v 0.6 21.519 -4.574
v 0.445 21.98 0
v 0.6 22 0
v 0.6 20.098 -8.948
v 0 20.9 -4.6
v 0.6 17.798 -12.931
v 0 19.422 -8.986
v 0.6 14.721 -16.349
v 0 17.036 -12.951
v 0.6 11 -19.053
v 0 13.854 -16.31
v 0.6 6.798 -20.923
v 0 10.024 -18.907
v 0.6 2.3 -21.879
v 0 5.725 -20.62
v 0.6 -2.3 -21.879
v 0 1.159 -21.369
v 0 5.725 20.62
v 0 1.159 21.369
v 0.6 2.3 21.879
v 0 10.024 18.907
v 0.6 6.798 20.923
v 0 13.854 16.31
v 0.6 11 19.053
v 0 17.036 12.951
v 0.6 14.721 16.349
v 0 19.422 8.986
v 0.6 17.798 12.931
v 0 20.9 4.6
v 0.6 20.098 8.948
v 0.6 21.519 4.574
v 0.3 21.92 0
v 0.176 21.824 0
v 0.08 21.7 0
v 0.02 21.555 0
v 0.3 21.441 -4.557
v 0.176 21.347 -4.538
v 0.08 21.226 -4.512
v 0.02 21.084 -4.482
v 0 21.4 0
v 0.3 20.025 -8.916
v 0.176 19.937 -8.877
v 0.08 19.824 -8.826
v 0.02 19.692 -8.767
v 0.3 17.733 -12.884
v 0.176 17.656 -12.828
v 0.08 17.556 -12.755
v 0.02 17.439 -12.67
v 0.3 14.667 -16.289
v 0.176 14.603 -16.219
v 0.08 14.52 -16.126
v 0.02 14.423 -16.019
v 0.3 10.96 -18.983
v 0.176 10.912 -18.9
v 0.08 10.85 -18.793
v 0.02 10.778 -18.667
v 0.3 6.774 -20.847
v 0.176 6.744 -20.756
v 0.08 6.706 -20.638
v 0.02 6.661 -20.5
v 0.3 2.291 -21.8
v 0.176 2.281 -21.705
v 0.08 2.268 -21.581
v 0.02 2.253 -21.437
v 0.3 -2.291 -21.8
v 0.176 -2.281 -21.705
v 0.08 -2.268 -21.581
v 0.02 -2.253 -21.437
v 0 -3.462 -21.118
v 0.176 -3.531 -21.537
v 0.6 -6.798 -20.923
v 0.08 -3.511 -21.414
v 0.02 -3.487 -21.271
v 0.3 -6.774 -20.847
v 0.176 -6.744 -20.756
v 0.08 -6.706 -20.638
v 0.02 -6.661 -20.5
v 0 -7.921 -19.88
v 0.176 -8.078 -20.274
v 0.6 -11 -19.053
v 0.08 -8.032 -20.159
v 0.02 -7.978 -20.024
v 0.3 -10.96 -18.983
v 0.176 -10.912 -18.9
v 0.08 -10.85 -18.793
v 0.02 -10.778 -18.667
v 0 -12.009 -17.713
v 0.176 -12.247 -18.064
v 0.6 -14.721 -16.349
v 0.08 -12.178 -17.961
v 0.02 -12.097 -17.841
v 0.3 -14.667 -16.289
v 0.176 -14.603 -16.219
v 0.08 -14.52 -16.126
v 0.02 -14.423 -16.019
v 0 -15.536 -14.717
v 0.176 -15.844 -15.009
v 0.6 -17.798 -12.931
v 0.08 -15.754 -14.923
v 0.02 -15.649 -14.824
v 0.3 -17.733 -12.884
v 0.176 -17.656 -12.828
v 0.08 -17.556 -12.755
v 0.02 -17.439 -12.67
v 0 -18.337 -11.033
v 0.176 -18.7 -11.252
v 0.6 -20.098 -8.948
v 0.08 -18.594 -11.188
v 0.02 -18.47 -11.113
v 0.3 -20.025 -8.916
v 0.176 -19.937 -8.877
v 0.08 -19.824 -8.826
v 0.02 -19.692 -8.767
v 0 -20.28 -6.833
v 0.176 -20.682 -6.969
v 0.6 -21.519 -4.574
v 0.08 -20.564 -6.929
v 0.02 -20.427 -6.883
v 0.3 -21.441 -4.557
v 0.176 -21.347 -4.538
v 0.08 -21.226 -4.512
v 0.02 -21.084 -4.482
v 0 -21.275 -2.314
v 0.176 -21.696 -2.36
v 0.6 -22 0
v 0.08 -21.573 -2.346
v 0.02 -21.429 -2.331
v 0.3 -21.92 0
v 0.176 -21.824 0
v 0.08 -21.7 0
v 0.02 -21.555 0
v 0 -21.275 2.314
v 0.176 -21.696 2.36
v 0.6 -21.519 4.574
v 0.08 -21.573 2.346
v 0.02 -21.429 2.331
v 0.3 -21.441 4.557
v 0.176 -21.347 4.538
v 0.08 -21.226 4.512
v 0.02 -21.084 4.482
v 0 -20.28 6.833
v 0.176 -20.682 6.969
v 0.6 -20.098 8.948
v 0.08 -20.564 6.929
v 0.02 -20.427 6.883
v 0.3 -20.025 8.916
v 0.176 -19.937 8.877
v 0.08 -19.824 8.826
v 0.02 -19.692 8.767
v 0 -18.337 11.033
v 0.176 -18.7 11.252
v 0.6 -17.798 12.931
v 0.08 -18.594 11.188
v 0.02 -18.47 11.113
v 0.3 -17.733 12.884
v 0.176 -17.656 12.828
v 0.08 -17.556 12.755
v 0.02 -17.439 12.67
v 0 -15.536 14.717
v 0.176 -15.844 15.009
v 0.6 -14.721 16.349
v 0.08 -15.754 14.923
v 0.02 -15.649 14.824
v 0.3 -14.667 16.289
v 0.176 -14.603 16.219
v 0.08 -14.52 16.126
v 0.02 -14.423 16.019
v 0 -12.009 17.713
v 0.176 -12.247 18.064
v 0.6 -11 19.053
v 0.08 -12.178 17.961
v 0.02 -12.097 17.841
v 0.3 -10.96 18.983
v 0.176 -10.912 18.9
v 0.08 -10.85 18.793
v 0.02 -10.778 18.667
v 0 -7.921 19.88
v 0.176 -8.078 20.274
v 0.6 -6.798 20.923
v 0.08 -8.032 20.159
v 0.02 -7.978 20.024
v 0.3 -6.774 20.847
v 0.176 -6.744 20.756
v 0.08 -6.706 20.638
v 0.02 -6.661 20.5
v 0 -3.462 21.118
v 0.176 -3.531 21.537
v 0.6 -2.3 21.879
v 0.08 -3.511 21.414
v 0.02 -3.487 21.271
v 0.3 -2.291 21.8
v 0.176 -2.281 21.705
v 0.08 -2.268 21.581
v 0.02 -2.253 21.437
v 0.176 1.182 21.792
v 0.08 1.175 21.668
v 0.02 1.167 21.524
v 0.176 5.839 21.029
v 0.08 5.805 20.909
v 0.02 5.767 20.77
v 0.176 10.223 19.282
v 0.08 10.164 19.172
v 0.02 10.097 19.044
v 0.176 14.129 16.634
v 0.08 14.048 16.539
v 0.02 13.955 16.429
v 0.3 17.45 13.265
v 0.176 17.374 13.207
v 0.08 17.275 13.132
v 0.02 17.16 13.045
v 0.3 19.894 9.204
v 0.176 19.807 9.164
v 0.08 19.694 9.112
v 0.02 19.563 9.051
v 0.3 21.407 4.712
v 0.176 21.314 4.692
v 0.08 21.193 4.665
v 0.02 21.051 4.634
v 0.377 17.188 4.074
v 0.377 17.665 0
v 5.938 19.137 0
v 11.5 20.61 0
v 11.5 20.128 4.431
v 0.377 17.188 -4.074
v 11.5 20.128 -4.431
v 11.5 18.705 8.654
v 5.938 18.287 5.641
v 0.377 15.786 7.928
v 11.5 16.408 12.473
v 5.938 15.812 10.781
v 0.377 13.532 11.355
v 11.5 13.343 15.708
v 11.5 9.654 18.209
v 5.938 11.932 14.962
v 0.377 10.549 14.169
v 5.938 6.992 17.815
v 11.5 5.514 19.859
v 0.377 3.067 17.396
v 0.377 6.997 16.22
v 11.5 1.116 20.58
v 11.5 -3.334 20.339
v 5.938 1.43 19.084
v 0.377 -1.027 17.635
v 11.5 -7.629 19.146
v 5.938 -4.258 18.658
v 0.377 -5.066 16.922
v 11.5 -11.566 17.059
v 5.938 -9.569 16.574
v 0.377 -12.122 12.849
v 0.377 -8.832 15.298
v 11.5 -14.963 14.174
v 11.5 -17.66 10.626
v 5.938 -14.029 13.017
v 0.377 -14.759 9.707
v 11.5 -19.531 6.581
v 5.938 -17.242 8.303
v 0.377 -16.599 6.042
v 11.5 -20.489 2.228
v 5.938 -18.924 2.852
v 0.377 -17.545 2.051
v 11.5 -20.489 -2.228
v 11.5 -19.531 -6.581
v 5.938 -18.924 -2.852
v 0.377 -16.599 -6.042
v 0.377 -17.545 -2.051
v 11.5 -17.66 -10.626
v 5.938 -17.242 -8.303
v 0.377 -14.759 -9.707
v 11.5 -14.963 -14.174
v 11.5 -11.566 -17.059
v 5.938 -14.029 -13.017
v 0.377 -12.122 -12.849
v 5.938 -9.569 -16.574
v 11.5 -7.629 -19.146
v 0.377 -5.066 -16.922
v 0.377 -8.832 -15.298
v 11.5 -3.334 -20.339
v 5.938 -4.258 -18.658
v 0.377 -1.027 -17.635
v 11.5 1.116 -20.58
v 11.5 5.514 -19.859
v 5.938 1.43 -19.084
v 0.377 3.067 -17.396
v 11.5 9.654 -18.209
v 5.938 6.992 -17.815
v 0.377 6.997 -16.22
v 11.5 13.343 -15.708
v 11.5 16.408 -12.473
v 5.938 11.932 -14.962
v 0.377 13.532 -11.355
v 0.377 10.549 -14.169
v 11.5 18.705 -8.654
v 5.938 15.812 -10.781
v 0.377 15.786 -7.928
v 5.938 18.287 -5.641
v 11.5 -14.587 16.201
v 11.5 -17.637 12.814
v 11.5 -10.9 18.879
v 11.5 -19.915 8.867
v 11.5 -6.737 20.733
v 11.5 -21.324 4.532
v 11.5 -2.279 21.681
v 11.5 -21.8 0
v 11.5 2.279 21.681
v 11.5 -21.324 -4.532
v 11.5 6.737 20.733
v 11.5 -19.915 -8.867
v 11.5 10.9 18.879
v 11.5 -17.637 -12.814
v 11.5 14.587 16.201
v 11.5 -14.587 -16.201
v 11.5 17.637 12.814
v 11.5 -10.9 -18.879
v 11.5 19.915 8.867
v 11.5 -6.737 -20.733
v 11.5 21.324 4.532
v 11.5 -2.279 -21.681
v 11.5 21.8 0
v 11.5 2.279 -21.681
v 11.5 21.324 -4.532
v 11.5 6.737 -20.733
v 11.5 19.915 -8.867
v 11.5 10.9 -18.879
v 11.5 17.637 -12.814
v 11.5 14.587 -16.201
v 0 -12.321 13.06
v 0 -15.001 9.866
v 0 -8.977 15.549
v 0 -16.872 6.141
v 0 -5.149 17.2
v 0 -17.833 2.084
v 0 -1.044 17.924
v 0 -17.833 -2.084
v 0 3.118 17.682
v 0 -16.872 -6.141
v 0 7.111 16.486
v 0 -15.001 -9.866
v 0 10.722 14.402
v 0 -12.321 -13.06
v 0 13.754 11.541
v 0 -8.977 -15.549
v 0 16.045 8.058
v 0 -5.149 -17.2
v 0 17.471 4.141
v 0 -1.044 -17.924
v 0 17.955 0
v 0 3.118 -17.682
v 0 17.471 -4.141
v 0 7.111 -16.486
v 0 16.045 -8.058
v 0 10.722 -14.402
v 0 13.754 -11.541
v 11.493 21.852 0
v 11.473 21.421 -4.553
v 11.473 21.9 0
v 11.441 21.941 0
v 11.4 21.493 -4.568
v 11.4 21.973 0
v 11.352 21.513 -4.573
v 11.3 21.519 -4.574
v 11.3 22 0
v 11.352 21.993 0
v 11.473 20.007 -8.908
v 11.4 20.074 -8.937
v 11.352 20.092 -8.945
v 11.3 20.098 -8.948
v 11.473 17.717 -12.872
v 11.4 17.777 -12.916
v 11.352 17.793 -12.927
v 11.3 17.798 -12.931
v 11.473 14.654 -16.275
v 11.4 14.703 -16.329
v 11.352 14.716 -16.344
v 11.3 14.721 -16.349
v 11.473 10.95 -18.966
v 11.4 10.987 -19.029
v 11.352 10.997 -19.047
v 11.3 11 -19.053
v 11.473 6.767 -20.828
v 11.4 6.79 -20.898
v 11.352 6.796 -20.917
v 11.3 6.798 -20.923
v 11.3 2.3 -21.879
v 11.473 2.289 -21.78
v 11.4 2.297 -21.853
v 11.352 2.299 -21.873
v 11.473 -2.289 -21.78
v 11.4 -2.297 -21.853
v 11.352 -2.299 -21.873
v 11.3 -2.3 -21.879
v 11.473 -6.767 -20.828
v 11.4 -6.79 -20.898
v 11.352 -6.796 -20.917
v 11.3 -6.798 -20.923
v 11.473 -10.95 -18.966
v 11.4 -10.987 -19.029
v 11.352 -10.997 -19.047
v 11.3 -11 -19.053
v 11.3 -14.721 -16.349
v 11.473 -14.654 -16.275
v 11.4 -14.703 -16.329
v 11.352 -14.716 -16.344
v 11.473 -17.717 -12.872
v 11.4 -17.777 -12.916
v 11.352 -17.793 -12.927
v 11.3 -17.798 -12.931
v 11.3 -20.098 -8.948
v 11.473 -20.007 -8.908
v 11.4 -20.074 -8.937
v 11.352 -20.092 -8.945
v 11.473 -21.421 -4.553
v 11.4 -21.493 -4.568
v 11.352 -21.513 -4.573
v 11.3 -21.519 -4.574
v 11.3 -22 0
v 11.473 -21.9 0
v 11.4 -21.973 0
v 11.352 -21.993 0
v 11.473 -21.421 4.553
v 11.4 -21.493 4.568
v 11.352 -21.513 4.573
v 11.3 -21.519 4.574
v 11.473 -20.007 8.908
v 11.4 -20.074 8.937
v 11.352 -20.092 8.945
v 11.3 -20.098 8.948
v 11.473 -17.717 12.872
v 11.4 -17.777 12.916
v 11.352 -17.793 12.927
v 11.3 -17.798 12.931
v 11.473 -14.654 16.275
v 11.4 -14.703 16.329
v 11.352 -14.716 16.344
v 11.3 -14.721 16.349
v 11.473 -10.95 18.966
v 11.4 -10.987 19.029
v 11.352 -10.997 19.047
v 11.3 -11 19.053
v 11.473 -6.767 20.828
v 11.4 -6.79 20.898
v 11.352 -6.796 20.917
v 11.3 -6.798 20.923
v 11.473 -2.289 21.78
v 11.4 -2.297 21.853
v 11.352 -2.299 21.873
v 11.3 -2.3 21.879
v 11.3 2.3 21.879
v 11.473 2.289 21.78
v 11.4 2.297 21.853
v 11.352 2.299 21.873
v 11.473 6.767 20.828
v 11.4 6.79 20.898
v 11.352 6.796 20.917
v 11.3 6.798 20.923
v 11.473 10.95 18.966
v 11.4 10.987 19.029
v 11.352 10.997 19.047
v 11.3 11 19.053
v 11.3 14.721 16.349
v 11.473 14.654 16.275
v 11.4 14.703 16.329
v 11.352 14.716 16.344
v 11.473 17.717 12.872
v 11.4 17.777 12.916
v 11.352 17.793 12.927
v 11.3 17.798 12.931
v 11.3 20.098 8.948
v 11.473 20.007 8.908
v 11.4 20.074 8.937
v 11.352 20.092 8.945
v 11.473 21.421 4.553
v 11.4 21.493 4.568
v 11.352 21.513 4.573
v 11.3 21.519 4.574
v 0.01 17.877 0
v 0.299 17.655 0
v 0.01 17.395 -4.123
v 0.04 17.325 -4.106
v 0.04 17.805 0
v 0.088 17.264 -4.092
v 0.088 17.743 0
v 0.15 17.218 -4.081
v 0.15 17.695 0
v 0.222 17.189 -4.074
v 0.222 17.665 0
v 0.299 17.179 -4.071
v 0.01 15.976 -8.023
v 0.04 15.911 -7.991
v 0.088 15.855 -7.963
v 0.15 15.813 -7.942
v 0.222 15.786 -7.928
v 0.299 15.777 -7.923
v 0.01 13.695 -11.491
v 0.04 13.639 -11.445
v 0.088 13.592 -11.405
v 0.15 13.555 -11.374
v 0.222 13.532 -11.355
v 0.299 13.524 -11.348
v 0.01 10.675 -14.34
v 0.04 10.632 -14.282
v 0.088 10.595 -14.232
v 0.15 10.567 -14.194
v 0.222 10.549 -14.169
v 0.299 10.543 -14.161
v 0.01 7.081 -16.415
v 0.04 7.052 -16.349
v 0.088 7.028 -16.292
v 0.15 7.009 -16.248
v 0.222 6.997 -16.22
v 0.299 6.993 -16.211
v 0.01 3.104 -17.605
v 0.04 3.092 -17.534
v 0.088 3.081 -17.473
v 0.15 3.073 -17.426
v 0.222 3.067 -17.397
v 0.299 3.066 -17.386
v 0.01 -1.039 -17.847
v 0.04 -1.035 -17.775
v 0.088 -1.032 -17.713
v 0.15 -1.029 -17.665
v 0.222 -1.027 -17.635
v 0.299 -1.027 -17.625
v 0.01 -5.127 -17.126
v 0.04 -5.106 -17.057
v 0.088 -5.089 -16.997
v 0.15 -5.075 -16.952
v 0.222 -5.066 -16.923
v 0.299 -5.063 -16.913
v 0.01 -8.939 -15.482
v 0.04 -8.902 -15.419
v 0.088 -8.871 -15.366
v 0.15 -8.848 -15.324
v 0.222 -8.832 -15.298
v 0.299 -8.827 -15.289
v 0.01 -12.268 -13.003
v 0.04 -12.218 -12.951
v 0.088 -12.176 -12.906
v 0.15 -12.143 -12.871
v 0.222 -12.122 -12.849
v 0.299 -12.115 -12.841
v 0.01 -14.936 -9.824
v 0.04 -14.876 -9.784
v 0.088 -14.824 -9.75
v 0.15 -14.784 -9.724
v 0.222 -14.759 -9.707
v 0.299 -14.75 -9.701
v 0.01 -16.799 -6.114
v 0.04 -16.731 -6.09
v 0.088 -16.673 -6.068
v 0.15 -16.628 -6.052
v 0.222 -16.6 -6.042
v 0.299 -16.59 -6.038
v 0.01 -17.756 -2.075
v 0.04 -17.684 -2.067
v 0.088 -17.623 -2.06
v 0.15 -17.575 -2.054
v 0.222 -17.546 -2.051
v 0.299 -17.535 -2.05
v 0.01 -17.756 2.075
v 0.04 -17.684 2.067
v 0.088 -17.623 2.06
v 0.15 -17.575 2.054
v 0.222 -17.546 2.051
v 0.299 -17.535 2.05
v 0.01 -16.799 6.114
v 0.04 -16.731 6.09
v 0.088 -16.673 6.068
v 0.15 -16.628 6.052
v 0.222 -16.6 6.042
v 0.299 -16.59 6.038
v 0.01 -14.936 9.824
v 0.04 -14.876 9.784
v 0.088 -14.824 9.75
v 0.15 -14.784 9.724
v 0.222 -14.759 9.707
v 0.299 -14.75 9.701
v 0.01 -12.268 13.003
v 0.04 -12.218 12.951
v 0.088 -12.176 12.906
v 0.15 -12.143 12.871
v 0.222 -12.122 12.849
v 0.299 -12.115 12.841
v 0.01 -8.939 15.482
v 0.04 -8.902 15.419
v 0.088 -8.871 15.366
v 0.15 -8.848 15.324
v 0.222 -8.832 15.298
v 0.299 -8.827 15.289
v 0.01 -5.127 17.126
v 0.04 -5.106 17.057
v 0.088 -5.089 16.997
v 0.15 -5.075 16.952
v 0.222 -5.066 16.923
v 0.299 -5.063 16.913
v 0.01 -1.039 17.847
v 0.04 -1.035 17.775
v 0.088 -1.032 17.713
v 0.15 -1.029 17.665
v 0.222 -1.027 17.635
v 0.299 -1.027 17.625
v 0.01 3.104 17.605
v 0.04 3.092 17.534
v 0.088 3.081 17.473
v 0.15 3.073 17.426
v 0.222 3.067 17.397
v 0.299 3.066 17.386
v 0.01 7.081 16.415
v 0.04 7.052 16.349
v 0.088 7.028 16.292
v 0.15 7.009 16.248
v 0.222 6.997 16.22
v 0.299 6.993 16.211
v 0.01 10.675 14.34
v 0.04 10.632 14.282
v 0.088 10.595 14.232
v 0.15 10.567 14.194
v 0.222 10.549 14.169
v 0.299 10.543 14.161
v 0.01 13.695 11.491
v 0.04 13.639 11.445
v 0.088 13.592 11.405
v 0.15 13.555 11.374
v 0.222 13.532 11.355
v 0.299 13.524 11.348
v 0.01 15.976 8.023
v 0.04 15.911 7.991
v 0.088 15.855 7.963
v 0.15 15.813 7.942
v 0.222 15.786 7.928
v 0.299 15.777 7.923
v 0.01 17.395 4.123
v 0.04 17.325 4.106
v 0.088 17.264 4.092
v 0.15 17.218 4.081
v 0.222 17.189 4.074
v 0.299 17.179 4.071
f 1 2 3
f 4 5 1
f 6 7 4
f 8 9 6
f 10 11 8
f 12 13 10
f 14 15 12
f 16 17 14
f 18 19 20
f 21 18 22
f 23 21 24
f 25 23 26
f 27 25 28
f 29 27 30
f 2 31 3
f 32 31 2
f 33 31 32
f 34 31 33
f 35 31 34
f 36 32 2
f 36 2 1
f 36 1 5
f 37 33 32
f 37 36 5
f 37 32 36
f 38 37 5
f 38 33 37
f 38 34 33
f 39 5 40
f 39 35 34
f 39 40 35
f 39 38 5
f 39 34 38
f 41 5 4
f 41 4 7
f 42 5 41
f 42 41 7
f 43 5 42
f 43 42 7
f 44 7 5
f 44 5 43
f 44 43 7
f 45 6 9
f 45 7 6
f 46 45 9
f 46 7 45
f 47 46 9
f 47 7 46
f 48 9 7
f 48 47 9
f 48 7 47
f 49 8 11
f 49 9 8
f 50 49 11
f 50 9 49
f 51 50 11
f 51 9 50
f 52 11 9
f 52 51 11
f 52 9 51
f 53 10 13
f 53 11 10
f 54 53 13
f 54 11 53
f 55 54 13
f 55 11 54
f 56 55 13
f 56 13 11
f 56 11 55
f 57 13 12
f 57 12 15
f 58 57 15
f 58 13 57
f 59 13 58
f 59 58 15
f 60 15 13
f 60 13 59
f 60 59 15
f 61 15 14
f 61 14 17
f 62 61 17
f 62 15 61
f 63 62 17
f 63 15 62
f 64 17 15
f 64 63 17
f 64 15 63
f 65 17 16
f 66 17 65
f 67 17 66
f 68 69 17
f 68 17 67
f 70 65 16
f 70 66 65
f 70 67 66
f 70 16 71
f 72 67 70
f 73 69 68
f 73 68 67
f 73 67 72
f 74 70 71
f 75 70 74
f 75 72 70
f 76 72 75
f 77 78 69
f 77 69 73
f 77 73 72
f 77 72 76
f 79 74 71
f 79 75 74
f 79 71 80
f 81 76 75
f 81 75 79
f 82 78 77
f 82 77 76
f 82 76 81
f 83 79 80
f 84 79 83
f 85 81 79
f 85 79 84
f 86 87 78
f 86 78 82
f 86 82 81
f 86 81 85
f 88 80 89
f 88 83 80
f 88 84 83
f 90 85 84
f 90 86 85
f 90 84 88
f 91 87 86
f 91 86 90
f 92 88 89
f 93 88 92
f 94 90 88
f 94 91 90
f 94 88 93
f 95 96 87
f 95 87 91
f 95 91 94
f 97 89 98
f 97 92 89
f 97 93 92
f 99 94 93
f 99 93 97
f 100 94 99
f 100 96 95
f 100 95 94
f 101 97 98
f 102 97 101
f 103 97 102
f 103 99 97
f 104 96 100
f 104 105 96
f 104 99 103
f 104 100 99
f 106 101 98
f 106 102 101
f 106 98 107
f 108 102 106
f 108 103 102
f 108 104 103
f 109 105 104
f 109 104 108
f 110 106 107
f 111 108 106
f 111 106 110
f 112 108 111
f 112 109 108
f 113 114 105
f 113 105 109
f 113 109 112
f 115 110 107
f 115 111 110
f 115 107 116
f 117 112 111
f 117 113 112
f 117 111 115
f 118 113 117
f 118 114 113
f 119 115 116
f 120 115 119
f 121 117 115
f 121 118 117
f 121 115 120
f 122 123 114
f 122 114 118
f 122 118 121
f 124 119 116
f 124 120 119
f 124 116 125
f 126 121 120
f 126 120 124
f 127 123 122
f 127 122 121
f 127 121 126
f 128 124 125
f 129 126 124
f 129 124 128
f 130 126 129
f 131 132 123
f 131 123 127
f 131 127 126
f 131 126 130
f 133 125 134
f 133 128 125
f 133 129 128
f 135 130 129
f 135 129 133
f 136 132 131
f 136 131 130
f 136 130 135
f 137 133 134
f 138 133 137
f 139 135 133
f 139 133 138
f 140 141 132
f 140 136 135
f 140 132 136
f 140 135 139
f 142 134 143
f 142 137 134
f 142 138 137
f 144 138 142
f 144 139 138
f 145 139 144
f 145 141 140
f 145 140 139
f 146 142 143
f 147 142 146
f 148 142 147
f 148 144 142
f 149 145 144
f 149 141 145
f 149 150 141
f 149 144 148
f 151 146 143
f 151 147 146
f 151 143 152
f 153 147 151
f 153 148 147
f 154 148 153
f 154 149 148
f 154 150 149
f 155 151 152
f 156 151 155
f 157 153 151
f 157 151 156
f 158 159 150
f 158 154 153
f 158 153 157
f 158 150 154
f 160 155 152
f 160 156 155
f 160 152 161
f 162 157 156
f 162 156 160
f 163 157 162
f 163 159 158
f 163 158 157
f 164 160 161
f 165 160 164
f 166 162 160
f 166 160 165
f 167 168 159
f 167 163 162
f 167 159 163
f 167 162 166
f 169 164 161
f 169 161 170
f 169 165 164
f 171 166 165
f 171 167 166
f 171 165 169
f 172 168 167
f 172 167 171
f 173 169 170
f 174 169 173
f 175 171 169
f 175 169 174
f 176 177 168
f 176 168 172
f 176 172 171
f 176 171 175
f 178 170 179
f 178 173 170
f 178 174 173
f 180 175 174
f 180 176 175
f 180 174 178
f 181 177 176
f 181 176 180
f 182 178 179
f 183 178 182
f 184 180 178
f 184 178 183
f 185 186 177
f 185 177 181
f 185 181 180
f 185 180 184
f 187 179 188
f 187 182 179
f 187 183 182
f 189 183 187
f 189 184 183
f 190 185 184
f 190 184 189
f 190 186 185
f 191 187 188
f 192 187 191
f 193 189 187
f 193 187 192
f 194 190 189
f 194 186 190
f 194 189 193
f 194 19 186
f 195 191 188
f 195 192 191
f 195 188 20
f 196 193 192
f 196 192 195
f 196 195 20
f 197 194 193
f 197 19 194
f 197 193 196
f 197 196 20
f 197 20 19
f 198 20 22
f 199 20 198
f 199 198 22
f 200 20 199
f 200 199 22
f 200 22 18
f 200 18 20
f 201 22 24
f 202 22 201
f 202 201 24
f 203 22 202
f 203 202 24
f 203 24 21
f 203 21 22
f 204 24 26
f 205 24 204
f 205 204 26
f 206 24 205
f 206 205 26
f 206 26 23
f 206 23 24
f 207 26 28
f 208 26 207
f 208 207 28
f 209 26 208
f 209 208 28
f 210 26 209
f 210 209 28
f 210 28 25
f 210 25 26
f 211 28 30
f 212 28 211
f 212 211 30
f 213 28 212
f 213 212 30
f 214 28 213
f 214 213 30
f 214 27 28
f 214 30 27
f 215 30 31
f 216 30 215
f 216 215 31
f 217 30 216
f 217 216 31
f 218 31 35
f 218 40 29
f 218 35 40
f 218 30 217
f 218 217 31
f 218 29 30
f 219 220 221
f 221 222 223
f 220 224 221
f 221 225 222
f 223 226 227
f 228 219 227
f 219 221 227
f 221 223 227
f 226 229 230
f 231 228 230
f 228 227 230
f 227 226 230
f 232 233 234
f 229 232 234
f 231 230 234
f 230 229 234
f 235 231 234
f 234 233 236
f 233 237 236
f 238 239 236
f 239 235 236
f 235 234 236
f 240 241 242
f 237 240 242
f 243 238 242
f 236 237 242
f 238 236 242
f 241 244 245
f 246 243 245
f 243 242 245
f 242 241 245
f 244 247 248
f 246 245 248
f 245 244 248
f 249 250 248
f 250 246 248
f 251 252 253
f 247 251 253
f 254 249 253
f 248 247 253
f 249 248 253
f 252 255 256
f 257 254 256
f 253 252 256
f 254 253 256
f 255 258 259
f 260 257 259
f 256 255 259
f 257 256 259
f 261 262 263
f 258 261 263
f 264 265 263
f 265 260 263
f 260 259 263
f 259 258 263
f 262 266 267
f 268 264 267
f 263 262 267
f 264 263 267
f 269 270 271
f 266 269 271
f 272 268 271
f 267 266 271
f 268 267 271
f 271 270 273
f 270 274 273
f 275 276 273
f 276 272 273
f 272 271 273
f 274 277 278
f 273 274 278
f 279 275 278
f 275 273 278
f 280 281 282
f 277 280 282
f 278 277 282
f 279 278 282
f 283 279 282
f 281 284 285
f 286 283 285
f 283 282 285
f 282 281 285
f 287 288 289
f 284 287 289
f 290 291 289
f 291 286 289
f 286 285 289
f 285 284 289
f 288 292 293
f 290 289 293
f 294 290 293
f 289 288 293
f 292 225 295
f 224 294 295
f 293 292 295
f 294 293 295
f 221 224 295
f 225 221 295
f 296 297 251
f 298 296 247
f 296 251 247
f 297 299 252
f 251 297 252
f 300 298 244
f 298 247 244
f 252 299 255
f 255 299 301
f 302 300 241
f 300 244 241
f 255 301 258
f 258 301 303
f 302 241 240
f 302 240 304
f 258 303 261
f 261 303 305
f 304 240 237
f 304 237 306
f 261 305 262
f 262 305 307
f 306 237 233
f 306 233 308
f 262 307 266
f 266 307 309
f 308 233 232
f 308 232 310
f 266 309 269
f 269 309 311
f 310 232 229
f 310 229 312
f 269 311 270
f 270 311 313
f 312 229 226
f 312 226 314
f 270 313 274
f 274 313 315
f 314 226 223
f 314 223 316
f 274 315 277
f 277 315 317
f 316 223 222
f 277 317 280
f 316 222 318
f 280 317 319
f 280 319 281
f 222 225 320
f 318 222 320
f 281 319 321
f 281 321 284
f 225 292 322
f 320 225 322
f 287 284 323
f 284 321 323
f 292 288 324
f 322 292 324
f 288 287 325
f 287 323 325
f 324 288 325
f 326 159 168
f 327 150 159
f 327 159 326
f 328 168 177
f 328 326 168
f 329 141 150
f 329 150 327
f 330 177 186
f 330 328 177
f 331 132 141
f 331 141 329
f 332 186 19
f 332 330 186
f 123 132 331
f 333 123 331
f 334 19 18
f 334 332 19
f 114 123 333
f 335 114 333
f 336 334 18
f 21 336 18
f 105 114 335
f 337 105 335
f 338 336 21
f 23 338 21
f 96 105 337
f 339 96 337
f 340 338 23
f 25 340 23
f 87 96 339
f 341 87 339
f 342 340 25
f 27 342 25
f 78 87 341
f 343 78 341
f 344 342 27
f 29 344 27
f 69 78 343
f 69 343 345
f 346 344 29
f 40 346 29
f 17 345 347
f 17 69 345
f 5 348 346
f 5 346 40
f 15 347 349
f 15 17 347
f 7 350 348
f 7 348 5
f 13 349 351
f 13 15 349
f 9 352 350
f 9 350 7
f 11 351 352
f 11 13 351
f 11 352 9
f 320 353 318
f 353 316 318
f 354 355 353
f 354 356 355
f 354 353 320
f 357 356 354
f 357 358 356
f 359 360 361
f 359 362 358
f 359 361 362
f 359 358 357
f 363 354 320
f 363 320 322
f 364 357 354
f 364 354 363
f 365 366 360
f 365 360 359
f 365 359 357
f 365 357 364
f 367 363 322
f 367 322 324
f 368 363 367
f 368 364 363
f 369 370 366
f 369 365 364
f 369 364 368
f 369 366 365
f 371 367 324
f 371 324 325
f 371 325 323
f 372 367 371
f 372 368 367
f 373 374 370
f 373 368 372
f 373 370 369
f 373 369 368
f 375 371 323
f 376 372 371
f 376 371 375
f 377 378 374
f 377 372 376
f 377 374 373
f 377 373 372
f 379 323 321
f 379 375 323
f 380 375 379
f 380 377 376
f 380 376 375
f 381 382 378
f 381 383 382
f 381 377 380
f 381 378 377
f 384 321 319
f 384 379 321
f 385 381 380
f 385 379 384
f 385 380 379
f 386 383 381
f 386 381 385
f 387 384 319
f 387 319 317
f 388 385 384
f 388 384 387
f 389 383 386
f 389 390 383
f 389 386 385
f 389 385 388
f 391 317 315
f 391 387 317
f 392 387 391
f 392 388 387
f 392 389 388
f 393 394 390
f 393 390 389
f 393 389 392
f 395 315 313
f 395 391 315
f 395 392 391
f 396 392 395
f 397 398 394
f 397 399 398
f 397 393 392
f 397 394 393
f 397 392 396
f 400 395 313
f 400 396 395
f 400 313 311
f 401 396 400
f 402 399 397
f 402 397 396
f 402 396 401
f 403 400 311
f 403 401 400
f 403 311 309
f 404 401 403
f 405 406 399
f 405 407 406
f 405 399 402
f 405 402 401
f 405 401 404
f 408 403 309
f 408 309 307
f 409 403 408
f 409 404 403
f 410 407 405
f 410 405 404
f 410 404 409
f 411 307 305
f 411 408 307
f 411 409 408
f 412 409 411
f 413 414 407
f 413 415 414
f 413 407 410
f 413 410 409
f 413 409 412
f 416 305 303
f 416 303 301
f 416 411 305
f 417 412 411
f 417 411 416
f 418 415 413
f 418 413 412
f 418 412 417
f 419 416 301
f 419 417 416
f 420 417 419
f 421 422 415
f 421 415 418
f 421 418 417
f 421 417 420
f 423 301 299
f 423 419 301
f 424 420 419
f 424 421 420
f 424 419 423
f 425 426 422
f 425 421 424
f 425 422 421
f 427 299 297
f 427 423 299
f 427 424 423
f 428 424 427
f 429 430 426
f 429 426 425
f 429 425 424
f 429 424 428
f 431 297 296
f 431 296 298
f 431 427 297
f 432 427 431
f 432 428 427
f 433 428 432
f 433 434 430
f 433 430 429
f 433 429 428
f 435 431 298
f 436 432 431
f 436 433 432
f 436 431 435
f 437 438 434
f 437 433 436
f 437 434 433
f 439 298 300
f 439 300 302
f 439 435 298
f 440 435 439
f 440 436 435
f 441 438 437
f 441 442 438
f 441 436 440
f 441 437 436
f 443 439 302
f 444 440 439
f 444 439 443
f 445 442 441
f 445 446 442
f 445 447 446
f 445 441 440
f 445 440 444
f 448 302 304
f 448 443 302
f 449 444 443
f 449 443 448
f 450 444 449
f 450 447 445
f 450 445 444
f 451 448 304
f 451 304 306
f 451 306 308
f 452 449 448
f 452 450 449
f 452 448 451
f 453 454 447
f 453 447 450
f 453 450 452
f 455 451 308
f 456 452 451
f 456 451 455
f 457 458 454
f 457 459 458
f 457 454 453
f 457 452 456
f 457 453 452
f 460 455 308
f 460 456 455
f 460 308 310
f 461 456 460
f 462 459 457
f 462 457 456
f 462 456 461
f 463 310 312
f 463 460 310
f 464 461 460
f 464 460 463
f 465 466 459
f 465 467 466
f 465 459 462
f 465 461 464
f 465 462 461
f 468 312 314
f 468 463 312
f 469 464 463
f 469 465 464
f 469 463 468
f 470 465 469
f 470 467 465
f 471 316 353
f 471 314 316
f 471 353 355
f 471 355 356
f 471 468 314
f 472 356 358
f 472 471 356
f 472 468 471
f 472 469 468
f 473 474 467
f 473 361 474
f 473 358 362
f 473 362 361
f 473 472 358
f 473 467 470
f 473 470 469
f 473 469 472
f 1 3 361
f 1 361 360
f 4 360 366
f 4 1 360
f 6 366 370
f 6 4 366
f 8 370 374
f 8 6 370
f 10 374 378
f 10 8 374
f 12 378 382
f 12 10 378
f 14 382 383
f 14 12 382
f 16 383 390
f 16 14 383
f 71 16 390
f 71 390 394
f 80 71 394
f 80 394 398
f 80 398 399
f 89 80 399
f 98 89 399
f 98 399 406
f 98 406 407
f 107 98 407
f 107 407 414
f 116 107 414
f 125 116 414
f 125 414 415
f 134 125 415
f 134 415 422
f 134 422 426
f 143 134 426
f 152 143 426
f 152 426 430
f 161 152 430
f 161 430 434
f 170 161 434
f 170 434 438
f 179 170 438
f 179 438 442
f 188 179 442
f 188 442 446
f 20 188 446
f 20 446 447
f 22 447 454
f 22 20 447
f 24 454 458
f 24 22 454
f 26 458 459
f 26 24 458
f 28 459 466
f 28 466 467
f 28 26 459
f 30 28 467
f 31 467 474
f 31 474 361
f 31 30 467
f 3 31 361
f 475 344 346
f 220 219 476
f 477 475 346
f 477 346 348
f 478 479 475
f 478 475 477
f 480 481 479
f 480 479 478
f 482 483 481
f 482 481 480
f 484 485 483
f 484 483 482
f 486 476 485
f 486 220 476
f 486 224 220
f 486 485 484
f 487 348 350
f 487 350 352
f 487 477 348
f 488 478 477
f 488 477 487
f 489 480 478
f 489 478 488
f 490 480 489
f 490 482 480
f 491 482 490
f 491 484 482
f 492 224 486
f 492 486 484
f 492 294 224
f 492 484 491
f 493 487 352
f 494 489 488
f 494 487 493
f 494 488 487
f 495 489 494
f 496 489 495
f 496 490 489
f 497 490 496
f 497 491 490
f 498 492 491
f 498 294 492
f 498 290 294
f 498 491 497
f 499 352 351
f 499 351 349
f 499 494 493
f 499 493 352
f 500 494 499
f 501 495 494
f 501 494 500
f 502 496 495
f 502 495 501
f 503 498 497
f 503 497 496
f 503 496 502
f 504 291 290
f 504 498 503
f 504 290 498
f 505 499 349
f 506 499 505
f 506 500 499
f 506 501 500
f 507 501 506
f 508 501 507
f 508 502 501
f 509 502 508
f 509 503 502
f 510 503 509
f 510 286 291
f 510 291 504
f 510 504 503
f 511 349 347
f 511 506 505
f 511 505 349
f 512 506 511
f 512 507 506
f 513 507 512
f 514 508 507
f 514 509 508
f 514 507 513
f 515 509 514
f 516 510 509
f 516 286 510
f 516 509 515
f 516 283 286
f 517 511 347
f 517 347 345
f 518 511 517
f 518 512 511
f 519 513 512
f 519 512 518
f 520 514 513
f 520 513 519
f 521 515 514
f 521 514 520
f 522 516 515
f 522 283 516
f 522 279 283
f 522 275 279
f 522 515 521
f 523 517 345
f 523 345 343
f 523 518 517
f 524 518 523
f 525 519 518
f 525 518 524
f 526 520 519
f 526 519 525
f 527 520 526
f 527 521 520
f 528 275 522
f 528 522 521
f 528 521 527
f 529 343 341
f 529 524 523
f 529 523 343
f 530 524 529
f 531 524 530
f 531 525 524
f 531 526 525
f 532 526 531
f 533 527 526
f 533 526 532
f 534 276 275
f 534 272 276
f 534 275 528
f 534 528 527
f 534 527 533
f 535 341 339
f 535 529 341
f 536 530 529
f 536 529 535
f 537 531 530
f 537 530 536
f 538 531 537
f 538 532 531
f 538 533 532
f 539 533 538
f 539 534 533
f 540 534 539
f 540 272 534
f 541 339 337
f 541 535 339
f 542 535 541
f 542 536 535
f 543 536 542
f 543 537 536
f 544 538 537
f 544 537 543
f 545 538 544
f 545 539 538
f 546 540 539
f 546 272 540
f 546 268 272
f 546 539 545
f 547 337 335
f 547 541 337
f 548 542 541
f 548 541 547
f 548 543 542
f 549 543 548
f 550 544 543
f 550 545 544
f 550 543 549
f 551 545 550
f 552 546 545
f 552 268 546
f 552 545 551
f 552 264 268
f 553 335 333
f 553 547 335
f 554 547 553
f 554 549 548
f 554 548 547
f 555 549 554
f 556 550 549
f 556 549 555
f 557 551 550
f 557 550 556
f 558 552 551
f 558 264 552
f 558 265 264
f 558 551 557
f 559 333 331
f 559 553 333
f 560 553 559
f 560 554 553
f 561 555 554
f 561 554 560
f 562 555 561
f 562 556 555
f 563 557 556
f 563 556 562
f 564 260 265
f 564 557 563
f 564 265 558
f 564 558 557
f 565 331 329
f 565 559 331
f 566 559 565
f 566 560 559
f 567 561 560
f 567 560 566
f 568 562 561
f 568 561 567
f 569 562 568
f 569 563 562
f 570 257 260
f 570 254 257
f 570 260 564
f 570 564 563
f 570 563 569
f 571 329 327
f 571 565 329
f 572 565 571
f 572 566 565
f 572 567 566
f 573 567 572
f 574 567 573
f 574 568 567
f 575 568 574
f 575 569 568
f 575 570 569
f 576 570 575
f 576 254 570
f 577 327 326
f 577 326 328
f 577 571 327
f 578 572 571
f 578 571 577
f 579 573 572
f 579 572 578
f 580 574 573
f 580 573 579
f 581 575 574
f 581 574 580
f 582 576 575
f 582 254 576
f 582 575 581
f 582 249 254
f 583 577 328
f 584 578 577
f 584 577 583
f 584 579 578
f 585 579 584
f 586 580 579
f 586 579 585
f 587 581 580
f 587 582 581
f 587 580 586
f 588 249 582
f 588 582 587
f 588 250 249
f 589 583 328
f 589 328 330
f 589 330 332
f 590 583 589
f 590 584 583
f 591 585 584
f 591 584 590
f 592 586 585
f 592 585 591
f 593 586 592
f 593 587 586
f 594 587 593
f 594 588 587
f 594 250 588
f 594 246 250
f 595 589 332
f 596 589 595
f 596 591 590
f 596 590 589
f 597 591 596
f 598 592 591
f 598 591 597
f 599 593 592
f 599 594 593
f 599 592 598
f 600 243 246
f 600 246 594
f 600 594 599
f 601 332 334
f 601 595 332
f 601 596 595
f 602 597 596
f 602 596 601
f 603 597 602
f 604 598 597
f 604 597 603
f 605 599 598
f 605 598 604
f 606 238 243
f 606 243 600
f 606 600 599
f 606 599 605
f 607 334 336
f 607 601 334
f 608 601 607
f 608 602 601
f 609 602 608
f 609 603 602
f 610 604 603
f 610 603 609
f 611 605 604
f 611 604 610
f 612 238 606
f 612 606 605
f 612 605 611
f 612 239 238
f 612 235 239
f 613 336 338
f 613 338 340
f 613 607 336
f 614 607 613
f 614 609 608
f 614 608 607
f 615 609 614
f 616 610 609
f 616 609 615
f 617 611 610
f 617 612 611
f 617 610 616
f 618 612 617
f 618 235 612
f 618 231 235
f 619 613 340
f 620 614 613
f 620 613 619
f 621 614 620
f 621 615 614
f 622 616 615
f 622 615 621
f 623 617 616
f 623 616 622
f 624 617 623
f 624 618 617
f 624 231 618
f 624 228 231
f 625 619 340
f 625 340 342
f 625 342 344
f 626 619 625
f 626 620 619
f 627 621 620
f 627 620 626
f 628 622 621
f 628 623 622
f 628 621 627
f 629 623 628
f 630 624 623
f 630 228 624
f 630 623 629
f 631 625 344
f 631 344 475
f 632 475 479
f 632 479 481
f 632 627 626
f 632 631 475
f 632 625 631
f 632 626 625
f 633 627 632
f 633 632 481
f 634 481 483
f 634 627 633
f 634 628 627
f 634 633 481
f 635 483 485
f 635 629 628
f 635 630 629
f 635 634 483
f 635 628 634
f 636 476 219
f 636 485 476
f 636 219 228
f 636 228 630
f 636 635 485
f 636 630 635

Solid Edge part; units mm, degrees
sketch "Sketch1" plane through (0, 0, 0) normal (0, 0, 1) x (1, 0, 0)
  arc A0 (0, 17.9546) -> (0.3768, 17.6646) centre (0.3, 17.9546) ccw
  line L0 (0.3768, 17.6646) -> (11.5, 20.6103)
  line L1 (11.5, 20.6103) -> (11.5, 21.8)
  arc A1 (11.5, 21.8) -> (11.3, 22) centre (11.3, 21.8) ccw
  line L2 (11.3, 22) -> (0.6, 22)
  arc A2 (0.6, 22) -> (0, 21.4) centre (0.6, 21.4) ccw
  line L3 (0, 21.4) -> (0, 17.9546)
revolve "RevolvedProtrusion1" add sketch "Sketch1" angle 360 about axis through (11.5, 0, 0) along (-1, 0, 0)
properties part number "320/22 X_or"
